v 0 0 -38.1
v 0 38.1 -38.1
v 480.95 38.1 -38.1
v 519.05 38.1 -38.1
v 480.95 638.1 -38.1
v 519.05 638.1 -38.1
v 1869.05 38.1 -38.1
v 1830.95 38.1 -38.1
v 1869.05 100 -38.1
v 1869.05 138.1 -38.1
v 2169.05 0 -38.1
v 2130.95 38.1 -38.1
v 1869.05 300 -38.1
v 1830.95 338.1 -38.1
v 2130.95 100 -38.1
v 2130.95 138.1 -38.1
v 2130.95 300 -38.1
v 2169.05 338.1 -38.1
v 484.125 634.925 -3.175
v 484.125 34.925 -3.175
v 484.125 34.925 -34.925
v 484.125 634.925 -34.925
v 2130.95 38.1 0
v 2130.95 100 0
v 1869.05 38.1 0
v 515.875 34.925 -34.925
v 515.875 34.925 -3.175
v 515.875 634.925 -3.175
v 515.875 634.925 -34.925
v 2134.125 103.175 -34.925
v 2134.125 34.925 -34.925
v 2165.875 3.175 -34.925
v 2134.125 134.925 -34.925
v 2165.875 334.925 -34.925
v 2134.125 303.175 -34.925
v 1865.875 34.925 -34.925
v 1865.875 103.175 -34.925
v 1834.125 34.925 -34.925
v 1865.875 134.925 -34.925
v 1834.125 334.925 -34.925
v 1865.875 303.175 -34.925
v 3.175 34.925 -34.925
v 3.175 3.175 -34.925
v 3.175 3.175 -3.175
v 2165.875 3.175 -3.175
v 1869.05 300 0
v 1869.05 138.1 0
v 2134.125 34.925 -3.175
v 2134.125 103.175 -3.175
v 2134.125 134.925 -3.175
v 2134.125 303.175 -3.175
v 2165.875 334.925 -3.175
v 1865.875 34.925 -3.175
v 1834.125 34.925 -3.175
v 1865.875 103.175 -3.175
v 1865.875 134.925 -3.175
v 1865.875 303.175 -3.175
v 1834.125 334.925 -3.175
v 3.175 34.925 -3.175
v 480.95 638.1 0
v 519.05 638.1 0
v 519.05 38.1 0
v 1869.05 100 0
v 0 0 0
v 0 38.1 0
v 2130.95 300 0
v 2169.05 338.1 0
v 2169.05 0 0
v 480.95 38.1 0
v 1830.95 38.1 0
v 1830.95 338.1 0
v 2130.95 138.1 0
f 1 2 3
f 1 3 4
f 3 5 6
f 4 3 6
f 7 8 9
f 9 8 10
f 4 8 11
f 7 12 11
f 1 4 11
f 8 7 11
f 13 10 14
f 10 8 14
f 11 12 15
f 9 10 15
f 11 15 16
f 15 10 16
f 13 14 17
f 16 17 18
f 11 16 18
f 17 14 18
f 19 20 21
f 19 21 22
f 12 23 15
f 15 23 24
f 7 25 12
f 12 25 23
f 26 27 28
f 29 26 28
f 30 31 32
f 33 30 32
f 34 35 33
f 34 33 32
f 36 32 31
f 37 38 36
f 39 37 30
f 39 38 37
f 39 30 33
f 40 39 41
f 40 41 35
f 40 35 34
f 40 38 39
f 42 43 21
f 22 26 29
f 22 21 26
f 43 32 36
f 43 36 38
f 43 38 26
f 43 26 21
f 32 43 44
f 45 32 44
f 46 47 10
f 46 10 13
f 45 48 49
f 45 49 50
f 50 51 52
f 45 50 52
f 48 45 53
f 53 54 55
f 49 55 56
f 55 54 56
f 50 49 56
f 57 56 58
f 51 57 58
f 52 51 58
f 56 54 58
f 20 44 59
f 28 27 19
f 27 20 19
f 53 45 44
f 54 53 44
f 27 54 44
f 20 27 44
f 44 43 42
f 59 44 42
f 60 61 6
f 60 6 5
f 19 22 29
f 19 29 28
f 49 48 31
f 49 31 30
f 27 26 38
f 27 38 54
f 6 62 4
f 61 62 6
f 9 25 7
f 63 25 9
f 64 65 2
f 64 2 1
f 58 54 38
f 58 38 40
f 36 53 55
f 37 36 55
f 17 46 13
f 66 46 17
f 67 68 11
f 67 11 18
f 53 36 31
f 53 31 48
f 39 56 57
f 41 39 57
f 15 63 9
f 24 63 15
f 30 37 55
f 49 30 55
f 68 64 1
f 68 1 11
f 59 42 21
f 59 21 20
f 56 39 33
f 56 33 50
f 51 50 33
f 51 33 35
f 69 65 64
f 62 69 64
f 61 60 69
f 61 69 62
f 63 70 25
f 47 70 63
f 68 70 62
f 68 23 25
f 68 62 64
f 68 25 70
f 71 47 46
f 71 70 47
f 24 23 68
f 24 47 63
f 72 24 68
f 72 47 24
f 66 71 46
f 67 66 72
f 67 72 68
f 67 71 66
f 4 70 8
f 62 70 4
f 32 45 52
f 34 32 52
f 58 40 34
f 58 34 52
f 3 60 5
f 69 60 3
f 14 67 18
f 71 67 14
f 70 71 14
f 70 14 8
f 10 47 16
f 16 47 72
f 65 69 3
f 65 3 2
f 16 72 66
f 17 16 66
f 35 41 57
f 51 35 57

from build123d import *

# Parameters (mm, degrees)
SKETCH1_W            = 261.9
SKETCH1_H            = 61.9
SKETCH1_H_2          = 161.9
BOSS_EXTRUDE1_DEPTH  = 38.1
SHELL1_START         = 3.175
SHELL1_OUTLINE_W     = 31.75
SHELL1_OUTLINE_H     = 31.75
SHELL1_DEPTH         = 2162.7
SHELL1_START_2       = 1834.125
SHELL1_2_OUTLINE_W   = 31.75
SHELL1_2_OUTLINE_H   = 31.75
SHELL1_2_DEPTH       = 331.75
SHELL1_START_3       = 484.125
SHELL1_3_OUTLINE_W   = 600
SHELL1_3_OUTLINE_H   = 31.75
SHELL1_3_DEPTH       = 31.75
SHELL1_4_OUTLINE_W   = 68.25
SHELL1_4_OUTLINE_H   = 31.75
SHELL1_4_OUTLINE_W_2 = 168.25
SHELL1_4_DEPTH       = 31.75
SHELL1_START_4       = 2134.125
SHELL1_5_OUTLINE_W   = 68.25
SHELL1_5_OUTLINE_H   = 31.75
SHELL1_5_OUTLINE_W_2 = 168.25
SHELL1_5_DEPTH       = 31.75


# Read off the part's stored shape, not the designer's step: Shell1
with BuildPart() as part:
    # Sketch1 → Boss-Extrude1 (new body)
    with BuildSketch(Plane.XY):
        Polygon((0, 0), (2169.05, 0), (2169.05, 38.1), (2169.05, 138.1), (2169.05, 338.1), (1869.05, 338.1), (1830.95, 338.1), (1830.95, 38.1), (519.05, 38.1), (519.05, 638.1), (480.95, 638.1), (480.95, 38.1), (0, 38.1), align=None)
        with Locations((2000, 69.05)):
            Rectangle(SKETCH1_W, SKETCH1_H, mode=Mode.SUBTRACT)
        with Locations((2000, 219.05)):
            Rectangle(SKETCH1_W, SKETCH1_H_2, mode=Mode.SUBTRACT)
    extrude(amount=-BOSS_EXTRUDE1_DEPTH)

    # Shell1 outline → Shell1 (cut)
    with BuildSketch(Plane.YZ.offset(SHELL1_START)):
        with Locations((19.05, -19.05)):
            Rectangle(SHELL1_OUTLINE_W, SHELL1_OUTLINE_H)
    extrude(amount=SHELL1_DEPTH, mode=Mode.SUBTRACT)

    # Shell1 2 outline → Shell1 2 (cut)
    with BuildSketch(Plane.YZ.offset(SHELL1_START_2)):
        with Locations((119.05, -19.05)):
            Rectangle(SHELL1_2_OUTLINE_W, SHELL1_2_OUTLINE_H)
        with Locations((319.05, -19.05)):
            Rectangle(SHELL1_2_OUTLINE_W, SHELL1_2_OUTLINE_H)
    extrude(amount=SHELL1_2_DEPTH, mode=Mode.SUBTRACT)

    # Shell1 3 outline → Shell1 3 (cut)
    with BuildSketch(Plane.YZ.offset(SHELL1_START_3)):
        with Locations((334.925, -19.05)):
            Rectangle(SHELL1_3_OUTLINE_W, SHELL1_3_OUTLINE_H)
    extrude(amount=SHELL1_3_DEPTH, mode=Mode.SUBTRACT)

    # Shell1 4 outline → Shell1 4 (cut)
    with BuildSketch(Plane.YZ.offset(SHELL1_START_2)):
        with Locations((69.05, -19.05)):
            Rectangle(SHELL1_4_OUTLINE_W, SHELL1_4_OUTLINE_H)
        with Locations((219.05, -19.05)):
            Rectangle(SHELL1_4_OUTLINE_W_2, SHELL1_4_OUTLINE_H)
    extrude(amount=SHELL1_4_DEPTH, mode=Mode.SUBTRACT)

    # Shell1 5 outline → Shell1 5 (cut)
    with BuildSketch(Plane.YZ.offset(SHELL1_START_4)):
        with Locations((69.05, -19.05)):
            Rectangle(SHELL1_5_OUTLINE_W, SHELL1_5_OUTLINE_H)
        with Locations((219.05, -19.05)):
            Rectangle(SHELL1_5_OUTLINE_W_2, SHELL1_5_OUTLINE_H)
    extrude(amount=SHELL1_5_DEPTH, mode=Mode.SUBTRACT)


solid = part.part
